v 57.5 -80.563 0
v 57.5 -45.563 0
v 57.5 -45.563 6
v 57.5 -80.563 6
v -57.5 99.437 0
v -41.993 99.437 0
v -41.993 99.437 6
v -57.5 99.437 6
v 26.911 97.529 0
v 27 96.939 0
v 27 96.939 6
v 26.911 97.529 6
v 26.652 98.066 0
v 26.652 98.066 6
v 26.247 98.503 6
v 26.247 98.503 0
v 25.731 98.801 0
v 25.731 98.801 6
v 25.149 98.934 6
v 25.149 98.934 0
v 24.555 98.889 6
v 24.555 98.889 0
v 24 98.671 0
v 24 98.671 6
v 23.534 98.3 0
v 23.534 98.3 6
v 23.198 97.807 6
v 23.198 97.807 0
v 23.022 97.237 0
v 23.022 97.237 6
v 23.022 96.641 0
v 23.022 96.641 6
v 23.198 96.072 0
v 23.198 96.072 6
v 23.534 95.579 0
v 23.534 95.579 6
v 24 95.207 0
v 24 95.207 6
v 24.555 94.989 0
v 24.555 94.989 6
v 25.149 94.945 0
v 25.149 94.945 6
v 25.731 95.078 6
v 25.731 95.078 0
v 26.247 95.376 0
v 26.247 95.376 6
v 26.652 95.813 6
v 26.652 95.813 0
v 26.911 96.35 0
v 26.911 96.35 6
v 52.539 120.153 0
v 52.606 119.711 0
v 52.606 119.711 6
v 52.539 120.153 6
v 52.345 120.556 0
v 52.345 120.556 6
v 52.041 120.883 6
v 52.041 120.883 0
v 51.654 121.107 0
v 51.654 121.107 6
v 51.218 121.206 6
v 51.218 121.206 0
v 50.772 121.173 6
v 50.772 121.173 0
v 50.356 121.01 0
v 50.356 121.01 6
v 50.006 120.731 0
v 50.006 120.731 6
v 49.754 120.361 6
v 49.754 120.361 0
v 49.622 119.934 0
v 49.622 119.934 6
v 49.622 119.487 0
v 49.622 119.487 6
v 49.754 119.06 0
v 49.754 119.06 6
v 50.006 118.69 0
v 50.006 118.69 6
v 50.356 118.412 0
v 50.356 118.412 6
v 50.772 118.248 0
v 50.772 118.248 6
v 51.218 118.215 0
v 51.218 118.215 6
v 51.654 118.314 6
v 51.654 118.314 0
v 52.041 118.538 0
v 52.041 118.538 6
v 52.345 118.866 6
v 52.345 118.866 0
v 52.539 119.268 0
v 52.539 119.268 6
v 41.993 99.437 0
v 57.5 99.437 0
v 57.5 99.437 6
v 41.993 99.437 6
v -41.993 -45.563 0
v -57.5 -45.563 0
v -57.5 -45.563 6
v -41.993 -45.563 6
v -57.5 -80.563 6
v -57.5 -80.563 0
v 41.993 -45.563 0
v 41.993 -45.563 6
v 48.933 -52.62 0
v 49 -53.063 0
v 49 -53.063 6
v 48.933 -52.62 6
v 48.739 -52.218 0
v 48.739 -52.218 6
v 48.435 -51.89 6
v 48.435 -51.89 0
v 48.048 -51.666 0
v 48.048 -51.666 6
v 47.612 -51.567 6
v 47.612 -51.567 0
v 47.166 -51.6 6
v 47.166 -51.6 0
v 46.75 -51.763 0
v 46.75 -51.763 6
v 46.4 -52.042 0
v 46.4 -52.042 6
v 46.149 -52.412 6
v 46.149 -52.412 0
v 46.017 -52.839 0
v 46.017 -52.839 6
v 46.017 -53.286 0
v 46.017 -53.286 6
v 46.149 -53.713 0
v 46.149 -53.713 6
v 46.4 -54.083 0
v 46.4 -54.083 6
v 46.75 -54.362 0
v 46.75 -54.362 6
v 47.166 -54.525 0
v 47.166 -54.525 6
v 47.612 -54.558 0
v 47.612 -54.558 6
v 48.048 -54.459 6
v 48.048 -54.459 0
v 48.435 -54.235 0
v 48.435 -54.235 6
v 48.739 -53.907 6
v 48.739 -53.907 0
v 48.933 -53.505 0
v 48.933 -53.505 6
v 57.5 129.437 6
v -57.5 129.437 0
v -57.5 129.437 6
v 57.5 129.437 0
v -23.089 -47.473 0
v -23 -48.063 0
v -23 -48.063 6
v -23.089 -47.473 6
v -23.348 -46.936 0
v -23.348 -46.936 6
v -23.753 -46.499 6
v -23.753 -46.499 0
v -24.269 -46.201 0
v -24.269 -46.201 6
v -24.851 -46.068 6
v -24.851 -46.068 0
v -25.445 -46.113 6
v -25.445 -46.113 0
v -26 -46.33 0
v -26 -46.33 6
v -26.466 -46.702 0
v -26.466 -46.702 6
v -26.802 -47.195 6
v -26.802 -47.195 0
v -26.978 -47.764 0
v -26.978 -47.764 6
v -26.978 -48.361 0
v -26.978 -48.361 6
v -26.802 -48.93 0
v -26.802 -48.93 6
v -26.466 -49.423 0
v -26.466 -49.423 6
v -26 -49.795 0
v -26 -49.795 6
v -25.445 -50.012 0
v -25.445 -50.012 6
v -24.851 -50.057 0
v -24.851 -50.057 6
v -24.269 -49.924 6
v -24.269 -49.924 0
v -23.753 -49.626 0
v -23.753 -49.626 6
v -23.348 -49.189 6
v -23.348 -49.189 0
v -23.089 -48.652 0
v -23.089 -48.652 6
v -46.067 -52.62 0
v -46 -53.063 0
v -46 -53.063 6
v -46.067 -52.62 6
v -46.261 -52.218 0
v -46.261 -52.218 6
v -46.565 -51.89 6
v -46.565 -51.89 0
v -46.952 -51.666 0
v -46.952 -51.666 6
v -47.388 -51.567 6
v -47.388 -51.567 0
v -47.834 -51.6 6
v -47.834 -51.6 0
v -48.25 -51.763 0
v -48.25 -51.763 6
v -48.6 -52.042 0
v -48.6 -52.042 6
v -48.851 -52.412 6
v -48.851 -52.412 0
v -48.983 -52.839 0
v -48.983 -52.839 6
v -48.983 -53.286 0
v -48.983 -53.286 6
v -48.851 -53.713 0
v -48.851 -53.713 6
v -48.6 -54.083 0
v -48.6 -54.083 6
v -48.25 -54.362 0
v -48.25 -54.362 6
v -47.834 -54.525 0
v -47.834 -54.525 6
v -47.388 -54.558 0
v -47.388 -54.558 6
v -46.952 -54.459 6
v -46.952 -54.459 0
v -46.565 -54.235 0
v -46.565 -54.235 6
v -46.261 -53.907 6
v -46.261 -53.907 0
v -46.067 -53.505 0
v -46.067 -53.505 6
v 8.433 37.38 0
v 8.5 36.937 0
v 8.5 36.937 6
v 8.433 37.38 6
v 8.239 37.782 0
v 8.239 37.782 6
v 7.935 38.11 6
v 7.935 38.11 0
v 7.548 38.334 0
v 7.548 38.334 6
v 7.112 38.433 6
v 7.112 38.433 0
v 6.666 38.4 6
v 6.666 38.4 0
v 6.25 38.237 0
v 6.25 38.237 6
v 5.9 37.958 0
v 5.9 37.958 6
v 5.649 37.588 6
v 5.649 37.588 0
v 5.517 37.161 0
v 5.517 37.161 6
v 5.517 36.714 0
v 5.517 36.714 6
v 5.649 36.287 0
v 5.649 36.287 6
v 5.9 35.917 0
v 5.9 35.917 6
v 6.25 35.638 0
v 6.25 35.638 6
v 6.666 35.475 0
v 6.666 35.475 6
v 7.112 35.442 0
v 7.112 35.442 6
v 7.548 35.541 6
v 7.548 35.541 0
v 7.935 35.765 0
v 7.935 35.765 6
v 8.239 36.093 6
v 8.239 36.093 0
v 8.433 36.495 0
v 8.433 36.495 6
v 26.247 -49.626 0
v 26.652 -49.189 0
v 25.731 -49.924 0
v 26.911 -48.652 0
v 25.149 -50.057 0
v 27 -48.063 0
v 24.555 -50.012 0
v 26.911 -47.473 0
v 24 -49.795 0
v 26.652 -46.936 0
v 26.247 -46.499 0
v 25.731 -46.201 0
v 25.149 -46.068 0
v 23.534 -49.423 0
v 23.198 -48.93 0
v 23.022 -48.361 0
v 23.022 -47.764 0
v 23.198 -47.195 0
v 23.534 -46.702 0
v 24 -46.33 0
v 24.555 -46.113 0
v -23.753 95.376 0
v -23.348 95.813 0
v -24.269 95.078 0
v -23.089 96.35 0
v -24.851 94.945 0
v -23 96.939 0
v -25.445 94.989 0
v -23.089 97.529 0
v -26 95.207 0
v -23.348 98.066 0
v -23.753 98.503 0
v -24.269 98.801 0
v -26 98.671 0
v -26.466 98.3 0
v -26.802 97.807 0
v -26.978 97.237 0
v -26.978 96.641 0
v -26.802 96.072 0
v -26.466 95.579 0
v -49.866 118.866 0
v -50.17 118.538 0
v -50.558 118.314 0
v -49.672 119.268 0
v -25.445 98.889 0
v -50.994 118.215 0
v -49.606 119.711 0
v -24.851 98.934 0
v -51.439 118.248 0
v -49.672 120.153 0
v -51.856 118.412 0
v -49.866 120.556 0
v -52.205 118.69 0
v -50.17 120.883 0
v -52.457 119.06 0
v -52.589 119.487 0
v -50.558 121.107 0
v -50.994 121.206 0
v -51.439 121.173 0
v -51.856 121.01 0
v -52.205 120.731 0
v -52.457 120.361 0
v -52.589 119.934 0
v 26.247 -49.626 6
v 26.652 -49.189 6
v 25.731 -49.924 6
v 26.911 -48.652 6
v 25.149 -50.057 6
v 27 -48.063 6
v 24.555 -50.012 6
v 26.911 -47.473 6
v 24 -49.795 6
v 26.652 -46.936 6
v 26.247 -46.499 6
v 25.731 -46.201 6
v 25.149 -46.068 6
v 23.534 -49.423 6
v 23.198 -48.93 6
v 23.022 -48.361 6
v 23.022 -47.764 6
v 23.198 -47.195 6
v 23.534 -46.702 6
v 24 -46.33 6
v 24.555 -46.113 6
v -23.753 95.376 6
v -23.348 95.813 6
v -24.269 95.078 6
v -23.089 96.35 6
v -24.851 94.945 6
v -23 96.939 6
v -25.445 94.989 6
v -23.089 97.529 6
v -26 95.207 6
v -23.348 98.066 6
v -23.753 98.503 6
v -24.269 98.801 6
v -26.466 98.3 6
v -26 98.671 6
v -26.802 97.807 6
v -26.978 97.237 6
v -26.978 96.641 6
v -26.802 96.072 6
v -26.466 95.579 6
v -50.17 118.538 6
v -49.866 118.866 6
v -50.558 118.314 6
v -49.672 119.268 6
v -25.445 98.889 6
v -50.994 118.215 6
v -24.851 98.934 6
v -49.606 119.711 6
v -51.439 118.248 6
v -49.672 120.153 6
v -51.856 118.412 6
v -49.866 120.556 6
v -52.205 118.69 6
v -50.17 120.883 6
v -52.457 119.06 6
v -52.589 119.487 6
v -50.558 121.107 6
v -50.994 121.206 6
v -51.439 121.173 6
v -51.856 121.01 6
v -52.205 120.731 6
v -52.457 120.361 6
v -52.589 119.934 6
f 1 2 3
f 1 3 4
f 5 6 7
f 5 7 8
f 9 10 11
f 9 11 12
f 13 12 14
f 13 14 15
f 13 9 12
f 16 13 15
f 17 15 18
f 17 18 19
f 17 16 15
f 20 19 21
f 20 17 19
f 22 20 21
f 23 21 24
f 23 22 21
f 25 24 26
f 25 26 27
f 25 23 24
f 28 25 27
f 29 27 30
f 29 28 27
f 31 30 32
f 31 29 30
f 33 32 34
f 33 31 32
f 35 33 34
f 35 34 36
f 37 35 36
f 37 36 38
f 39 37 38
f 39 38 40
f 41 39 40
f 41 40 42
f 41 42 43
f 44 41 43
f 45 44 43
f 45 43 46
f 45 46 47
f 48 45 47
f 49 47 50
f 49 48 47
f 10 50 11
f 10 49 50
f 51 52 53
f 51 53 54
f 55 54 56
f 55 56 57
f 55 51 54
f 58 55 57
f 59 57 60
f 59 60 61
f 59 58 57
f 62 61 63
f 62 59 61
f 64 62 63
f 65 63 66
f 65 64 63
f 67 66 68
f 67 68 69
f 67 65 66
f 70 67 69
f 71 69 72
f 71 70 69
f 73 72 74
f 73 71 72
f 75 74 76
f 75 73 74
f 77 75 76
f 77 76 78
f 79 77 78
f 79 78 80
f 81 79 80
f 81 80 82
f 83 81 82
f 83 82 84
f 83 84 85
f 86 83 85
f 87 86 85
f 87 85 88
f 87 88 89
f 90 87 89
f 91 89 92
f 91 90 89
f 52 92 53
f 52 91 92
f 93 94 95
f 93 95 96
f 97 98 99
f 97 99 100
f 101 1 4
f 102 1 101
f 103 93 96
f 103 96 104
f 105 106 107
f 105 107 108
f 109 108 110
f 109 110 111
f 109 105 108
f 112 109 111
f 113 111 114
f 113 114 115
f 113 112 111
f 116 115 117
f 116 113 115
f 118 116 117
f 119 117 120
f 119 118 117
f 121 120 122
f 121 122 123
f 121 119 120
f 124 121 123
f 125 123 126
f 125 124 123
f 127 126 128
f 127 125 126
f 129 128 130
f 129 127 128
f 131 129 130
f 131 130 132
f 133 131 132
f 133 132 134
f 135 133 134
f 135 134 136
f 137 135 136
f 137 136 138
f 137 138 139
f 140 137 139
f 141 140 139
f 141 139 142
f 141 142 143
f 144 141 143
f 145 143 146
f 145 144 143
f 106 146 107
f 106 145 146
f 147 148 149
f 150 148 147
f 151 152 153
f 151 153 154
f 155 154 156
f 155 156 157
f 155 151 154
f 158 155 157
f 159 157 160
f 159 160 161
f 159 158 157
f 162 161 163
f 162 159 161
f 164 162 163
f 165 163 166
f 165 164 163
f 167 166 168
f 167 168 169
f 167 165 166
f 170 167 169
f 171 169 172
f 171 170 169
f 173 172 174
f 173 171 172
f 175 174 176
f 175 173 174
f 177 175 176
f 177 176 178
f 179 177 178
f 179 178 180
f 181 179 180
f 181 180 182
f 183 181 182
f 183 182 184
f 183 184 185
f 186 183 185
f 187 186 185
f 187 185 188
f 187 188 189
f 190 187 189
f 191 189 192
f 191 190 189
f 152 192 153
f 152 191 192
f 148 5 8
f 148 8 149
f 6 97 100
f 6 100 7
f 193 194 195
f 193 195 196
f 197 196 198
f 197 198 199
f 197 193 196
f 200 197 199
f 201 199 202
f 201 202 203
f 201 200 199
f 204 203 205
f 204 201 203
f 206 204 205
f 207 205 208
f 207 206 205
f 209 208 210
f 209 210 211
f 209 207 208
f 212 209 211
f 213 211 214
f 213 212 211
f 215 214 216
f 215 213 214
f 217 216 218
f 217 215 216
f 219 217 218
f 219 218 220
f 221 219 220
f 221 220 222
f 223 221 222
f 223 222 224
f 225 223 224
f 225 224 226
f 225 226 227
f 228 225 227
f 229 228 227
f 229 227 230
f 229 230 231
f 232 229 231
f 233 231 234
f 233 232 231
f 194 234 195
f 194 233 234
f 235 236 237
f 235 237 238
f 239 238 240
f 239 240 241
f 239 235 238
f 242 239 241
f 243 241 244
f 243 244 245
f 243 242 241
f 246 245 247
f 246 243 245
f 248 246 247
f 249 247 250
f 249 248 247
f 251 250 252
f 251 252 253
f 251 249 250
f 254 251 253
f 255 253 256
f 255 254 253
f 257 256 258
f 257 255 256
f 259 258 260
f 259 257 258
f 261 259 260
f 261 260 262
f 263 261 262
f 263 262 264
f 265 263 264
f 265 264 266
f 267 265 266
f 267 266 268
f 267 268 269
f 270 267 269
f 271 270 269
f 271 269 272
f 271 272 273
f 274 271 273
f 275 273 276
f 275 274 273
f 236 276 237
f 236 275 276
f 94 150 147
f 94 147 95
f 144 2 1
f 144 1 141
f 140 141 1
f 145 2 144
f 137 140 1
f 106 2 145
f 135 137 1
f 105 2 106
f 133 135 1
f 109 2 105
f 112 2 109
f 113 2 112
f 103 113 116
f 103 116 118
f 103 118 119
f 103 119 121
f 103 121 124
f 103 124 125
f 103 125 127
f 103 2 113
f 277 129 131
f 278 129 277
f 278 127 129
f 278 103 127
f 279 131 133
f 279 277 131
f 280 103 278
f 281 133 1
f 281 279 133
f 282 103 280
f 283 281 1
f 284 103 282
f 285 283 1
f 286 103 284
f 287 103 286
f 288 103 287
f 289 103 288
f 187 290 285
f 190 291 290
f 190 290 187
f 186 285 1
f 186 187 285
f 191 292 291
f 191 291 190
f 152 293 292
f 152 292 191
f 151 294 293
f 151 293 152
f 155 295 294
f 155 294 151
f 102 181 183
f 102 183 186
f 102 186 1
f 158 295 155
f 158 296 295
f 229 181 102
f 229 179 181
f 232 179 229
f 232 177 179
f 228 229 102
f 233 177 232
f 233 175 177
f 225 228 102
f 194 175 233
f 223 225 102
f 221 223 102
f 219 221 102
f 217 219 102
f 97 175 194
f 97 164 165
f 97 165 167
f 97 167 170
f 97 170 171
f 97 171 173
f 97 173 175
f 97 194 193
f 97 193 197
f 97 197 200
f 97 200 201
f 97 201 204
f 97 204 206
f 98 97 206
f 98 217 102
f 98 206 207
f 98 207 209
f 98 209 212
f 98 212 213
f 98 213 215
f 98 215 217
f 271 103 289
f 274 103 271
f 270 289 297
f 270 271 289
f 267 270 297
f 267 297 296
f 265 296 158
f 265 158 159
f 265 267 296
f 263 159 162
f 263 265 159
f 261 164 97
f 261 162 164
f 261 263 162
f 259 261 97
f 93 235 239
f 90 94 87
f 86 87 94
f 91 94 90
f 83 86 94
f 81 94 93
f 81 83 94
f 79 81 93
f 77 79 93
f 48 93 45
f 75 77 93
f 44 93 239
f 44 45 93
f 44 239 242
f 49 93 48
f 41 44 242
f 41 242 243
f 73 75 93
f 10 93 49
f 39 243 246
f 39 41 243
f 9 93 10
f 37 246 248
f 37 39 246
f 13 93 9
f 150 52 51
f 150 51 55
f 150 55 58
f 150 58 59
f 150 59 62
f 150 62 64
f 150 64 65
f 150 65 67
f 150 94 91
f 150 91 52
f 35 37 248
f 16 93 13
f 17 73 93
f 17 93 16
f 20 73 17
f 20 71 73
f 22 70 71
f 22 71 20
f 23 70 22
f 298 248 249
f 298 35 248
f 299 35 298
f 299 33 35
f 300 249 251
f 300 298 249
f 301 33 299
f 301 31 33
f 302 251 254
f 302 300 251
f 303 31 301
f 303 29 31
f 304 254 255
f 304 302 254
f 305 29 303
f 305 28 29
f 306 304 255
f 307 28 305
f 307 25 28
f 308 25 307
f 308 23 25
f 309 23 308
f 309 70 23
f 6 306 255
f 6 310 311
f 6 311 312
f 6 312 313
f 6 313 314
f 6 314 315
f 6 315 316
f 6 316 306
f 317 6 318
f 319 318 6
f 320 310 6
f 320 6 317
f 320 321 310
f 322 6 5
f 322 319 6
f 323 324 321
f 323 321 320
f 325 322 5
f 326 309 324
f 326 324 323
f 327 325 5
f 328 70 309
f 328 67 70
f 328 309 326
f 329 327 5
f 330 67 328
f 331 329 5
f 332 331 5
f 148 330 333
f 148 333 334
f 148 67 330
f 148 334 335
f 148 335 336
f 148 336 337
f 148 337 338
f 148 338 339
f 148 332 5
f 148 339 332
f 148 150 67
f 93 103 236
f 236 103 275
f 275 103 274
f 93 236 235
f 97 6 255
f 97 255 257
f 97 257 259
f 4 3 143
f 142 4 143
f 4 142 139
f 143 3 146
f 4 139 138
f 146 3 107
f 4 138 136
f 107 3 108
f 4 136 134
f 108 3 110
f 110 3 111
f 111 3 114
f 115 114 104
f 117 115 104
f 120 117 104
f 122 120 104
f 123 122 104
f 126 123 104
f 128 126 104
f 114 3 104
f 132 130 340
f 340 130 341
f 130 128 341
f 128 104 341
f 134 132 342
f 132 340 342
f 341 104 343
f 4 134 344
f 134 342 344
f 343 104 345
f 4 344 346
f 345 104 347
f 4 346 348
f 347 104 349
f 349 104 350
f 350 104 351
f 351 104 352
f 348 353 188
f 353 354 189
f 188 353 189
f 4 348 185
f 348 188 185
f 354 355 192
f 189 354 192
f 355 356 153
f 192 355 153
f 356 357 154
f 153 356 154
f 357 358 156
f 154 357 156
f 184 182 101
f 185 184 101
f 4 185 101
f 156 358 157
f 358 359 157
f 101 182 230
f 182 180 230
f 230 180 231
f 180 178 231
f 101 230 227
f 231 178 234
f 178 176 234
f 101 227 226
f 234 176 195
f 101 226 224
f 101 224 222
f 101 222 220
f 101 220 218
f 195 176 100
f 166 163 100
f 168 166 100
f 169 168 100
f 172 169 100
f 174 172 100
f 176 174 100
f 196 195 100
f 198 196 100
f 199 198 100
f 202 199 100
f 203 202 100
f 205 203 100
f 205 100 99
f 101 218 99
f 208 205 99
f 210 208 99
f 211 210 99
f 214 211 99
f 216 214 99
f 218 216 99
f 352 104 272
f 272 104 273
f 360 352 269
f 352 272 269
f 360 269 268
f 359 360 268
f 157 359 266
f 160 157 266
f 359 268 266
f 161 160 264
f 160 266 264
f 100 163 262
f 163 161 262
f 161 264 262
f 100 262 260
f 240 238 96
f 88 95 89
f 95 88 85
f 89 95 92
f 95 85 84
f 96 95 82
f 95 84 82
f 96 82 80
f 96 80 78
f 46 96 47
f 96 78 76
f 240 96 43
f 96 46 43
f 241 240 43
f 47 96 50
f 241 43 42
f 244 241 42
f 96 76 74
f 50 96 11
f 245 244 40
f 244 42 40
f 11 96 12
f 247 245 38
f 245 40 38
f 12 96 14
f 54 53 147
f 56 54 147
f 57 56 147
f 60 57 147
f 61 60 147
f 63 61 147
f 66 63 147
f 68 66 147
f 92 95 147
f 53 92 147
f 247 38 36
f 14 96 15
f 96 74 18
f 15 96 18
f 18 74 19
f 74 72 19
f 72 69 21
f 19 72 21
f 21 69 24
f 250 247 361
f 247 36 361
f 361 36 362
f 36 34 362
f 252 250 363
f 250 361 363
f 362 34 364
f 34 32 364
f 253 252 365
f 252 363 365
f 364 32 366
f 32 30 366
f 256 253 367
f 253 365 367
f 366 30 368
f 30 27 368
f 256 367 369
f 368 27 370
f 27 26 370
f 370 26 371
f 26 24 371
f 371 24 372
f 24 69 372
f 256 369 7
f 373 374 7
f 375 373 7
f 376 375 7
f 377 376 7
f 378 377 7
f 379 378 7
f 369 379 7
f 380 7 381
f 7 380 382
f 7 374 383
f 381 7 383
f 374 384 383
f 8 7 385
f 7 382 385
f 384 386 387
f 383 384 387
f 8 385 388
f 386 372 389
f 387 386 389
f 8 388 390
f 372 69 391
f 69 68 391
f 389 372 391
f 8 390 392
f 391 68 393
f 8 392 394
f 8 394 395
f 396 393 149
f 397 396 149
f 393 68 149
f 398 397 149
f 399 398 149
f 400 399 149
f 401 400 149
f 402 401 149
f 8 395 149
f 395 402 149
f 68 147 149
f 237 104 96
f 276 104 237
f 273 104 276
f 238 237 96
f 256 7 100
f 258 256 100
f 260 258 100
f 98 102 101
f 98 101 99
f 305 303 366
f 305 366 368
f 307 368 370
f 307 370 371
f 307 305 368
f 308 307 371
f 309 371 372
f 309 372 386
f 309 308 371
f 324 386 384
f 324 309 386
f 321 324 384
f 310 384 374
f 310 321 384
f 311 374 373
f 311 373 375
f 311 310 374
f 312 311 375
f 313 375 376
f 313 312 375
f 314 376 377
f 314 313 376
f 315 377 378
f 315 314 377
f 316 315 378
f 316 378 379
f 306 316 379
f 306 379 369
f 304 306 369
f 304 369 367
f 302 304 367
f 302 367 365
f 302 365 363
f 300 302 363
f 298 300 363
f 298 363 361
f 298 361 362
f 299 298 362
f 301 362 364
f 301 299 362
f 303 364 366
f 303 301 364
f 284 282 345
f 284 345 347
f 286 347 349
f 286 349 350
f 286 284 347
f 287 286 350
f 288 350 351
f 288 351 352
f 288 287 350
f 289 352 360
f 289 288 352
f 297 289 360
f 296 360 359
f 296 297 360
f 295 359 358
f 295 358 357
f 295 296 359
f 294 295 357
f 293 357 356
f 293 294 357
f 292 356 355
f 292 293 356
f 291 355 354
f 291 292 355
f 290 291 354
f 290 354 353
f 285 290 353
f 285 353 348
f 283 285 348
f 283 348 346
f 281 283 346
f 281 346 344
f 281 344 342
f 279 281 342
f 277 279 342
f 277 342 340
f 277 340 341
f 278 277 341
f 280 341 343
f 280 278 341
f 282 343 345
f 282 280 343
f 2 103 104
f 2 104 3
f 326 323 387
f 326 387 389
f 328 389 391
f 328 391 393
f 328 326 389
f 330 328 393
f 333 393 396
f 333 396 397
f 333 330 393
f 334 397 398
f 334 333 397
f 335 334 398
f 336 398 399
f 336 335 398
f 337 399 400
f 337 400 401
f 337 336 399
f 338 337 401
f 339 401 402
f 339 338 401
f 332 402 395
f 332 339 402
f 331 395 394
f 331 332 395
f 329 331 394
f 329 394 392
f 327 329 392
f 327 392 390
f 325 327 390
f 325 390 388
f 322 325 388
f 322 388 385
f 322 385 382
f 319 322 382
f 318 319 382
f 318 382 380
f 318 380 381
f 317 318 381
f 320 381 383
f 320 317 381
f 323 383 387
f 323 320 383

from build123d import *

# Parameters (mm, degrees)
SKETCH_1_R      = 1.5
SKETCH_1_R_2    = 2
EXTRUDE_1_DEPTH = 6


with BuildPart() as part:
    # Эскиз1 → Бобышка-Вытянуть1 (new body)
    with BuildSketch(Plane.XY):
        Polygon((-48.7844548, 129.437494331), (-57.5, 129.437494331), (-57.5, 112.022171177), (-57.5, 99.437494331), (-41.992637301, 99.437494331), (-41.992637301, -45.562505669), (-57.5, -45.562505669), (-57.5, -52.165920458), (-57.5, -53.062505669), (-57.5, -80.562505669), (-47.5, -80.562505669), (-25, -80.562505669), (7, -80.562505669), (57.5, -80.562505669), (57.5, -45.562505669), (41.992637301, -45.562505669), (41.992637301, 99.437494331), (57.5, 99.437494331), (57.5, 129.437494331), (-25.341365772, 129.437494331), align=None)
        with Locations((-47.5, -53.062505669)):
            Circle(SKETCH_1_R, mode=Mode.SUBTRACT)
        with Locations((-25, -48.062505669)):
            Circle(SKETCH_1_R_2, mode=Mode.SUBTRACT)
        with Locations((25, -48.062505669)):
            Circle(SKETCH_1_R_2, mode=Mode.SUBTRACT)
        with Locations((47.5, -53.062505669)):
            Circle(SKETCH_1_R, mode=Mode.SUBTRACT)
        with Locations((-51.105648031, 119.710621144)):
            Circle(SKETCH_1_R, mode=Mode.SUBTRACT)
        with Locations((-25, 96.939287159)):
            Circle(SKETCH_1_R_2, mode=Mode.SUBTRACT)
        with Locations((7, 36.937494331)):
            Circle(SKETCH_1_R, mode=Mode.SUBTRACT)
        with Locations((25, 96.939287159)):
            Circle(SKETCH_1_R_2, mode=Mode.SUBTRACT)
        with Locations((51.105648031, 119.710621144)):
            Circle(SKETCH_1_R, mode=Mode.SUBTRACT)
    extrude(amount=EXTRUDE_1_DEPTH)


solid = part.part
